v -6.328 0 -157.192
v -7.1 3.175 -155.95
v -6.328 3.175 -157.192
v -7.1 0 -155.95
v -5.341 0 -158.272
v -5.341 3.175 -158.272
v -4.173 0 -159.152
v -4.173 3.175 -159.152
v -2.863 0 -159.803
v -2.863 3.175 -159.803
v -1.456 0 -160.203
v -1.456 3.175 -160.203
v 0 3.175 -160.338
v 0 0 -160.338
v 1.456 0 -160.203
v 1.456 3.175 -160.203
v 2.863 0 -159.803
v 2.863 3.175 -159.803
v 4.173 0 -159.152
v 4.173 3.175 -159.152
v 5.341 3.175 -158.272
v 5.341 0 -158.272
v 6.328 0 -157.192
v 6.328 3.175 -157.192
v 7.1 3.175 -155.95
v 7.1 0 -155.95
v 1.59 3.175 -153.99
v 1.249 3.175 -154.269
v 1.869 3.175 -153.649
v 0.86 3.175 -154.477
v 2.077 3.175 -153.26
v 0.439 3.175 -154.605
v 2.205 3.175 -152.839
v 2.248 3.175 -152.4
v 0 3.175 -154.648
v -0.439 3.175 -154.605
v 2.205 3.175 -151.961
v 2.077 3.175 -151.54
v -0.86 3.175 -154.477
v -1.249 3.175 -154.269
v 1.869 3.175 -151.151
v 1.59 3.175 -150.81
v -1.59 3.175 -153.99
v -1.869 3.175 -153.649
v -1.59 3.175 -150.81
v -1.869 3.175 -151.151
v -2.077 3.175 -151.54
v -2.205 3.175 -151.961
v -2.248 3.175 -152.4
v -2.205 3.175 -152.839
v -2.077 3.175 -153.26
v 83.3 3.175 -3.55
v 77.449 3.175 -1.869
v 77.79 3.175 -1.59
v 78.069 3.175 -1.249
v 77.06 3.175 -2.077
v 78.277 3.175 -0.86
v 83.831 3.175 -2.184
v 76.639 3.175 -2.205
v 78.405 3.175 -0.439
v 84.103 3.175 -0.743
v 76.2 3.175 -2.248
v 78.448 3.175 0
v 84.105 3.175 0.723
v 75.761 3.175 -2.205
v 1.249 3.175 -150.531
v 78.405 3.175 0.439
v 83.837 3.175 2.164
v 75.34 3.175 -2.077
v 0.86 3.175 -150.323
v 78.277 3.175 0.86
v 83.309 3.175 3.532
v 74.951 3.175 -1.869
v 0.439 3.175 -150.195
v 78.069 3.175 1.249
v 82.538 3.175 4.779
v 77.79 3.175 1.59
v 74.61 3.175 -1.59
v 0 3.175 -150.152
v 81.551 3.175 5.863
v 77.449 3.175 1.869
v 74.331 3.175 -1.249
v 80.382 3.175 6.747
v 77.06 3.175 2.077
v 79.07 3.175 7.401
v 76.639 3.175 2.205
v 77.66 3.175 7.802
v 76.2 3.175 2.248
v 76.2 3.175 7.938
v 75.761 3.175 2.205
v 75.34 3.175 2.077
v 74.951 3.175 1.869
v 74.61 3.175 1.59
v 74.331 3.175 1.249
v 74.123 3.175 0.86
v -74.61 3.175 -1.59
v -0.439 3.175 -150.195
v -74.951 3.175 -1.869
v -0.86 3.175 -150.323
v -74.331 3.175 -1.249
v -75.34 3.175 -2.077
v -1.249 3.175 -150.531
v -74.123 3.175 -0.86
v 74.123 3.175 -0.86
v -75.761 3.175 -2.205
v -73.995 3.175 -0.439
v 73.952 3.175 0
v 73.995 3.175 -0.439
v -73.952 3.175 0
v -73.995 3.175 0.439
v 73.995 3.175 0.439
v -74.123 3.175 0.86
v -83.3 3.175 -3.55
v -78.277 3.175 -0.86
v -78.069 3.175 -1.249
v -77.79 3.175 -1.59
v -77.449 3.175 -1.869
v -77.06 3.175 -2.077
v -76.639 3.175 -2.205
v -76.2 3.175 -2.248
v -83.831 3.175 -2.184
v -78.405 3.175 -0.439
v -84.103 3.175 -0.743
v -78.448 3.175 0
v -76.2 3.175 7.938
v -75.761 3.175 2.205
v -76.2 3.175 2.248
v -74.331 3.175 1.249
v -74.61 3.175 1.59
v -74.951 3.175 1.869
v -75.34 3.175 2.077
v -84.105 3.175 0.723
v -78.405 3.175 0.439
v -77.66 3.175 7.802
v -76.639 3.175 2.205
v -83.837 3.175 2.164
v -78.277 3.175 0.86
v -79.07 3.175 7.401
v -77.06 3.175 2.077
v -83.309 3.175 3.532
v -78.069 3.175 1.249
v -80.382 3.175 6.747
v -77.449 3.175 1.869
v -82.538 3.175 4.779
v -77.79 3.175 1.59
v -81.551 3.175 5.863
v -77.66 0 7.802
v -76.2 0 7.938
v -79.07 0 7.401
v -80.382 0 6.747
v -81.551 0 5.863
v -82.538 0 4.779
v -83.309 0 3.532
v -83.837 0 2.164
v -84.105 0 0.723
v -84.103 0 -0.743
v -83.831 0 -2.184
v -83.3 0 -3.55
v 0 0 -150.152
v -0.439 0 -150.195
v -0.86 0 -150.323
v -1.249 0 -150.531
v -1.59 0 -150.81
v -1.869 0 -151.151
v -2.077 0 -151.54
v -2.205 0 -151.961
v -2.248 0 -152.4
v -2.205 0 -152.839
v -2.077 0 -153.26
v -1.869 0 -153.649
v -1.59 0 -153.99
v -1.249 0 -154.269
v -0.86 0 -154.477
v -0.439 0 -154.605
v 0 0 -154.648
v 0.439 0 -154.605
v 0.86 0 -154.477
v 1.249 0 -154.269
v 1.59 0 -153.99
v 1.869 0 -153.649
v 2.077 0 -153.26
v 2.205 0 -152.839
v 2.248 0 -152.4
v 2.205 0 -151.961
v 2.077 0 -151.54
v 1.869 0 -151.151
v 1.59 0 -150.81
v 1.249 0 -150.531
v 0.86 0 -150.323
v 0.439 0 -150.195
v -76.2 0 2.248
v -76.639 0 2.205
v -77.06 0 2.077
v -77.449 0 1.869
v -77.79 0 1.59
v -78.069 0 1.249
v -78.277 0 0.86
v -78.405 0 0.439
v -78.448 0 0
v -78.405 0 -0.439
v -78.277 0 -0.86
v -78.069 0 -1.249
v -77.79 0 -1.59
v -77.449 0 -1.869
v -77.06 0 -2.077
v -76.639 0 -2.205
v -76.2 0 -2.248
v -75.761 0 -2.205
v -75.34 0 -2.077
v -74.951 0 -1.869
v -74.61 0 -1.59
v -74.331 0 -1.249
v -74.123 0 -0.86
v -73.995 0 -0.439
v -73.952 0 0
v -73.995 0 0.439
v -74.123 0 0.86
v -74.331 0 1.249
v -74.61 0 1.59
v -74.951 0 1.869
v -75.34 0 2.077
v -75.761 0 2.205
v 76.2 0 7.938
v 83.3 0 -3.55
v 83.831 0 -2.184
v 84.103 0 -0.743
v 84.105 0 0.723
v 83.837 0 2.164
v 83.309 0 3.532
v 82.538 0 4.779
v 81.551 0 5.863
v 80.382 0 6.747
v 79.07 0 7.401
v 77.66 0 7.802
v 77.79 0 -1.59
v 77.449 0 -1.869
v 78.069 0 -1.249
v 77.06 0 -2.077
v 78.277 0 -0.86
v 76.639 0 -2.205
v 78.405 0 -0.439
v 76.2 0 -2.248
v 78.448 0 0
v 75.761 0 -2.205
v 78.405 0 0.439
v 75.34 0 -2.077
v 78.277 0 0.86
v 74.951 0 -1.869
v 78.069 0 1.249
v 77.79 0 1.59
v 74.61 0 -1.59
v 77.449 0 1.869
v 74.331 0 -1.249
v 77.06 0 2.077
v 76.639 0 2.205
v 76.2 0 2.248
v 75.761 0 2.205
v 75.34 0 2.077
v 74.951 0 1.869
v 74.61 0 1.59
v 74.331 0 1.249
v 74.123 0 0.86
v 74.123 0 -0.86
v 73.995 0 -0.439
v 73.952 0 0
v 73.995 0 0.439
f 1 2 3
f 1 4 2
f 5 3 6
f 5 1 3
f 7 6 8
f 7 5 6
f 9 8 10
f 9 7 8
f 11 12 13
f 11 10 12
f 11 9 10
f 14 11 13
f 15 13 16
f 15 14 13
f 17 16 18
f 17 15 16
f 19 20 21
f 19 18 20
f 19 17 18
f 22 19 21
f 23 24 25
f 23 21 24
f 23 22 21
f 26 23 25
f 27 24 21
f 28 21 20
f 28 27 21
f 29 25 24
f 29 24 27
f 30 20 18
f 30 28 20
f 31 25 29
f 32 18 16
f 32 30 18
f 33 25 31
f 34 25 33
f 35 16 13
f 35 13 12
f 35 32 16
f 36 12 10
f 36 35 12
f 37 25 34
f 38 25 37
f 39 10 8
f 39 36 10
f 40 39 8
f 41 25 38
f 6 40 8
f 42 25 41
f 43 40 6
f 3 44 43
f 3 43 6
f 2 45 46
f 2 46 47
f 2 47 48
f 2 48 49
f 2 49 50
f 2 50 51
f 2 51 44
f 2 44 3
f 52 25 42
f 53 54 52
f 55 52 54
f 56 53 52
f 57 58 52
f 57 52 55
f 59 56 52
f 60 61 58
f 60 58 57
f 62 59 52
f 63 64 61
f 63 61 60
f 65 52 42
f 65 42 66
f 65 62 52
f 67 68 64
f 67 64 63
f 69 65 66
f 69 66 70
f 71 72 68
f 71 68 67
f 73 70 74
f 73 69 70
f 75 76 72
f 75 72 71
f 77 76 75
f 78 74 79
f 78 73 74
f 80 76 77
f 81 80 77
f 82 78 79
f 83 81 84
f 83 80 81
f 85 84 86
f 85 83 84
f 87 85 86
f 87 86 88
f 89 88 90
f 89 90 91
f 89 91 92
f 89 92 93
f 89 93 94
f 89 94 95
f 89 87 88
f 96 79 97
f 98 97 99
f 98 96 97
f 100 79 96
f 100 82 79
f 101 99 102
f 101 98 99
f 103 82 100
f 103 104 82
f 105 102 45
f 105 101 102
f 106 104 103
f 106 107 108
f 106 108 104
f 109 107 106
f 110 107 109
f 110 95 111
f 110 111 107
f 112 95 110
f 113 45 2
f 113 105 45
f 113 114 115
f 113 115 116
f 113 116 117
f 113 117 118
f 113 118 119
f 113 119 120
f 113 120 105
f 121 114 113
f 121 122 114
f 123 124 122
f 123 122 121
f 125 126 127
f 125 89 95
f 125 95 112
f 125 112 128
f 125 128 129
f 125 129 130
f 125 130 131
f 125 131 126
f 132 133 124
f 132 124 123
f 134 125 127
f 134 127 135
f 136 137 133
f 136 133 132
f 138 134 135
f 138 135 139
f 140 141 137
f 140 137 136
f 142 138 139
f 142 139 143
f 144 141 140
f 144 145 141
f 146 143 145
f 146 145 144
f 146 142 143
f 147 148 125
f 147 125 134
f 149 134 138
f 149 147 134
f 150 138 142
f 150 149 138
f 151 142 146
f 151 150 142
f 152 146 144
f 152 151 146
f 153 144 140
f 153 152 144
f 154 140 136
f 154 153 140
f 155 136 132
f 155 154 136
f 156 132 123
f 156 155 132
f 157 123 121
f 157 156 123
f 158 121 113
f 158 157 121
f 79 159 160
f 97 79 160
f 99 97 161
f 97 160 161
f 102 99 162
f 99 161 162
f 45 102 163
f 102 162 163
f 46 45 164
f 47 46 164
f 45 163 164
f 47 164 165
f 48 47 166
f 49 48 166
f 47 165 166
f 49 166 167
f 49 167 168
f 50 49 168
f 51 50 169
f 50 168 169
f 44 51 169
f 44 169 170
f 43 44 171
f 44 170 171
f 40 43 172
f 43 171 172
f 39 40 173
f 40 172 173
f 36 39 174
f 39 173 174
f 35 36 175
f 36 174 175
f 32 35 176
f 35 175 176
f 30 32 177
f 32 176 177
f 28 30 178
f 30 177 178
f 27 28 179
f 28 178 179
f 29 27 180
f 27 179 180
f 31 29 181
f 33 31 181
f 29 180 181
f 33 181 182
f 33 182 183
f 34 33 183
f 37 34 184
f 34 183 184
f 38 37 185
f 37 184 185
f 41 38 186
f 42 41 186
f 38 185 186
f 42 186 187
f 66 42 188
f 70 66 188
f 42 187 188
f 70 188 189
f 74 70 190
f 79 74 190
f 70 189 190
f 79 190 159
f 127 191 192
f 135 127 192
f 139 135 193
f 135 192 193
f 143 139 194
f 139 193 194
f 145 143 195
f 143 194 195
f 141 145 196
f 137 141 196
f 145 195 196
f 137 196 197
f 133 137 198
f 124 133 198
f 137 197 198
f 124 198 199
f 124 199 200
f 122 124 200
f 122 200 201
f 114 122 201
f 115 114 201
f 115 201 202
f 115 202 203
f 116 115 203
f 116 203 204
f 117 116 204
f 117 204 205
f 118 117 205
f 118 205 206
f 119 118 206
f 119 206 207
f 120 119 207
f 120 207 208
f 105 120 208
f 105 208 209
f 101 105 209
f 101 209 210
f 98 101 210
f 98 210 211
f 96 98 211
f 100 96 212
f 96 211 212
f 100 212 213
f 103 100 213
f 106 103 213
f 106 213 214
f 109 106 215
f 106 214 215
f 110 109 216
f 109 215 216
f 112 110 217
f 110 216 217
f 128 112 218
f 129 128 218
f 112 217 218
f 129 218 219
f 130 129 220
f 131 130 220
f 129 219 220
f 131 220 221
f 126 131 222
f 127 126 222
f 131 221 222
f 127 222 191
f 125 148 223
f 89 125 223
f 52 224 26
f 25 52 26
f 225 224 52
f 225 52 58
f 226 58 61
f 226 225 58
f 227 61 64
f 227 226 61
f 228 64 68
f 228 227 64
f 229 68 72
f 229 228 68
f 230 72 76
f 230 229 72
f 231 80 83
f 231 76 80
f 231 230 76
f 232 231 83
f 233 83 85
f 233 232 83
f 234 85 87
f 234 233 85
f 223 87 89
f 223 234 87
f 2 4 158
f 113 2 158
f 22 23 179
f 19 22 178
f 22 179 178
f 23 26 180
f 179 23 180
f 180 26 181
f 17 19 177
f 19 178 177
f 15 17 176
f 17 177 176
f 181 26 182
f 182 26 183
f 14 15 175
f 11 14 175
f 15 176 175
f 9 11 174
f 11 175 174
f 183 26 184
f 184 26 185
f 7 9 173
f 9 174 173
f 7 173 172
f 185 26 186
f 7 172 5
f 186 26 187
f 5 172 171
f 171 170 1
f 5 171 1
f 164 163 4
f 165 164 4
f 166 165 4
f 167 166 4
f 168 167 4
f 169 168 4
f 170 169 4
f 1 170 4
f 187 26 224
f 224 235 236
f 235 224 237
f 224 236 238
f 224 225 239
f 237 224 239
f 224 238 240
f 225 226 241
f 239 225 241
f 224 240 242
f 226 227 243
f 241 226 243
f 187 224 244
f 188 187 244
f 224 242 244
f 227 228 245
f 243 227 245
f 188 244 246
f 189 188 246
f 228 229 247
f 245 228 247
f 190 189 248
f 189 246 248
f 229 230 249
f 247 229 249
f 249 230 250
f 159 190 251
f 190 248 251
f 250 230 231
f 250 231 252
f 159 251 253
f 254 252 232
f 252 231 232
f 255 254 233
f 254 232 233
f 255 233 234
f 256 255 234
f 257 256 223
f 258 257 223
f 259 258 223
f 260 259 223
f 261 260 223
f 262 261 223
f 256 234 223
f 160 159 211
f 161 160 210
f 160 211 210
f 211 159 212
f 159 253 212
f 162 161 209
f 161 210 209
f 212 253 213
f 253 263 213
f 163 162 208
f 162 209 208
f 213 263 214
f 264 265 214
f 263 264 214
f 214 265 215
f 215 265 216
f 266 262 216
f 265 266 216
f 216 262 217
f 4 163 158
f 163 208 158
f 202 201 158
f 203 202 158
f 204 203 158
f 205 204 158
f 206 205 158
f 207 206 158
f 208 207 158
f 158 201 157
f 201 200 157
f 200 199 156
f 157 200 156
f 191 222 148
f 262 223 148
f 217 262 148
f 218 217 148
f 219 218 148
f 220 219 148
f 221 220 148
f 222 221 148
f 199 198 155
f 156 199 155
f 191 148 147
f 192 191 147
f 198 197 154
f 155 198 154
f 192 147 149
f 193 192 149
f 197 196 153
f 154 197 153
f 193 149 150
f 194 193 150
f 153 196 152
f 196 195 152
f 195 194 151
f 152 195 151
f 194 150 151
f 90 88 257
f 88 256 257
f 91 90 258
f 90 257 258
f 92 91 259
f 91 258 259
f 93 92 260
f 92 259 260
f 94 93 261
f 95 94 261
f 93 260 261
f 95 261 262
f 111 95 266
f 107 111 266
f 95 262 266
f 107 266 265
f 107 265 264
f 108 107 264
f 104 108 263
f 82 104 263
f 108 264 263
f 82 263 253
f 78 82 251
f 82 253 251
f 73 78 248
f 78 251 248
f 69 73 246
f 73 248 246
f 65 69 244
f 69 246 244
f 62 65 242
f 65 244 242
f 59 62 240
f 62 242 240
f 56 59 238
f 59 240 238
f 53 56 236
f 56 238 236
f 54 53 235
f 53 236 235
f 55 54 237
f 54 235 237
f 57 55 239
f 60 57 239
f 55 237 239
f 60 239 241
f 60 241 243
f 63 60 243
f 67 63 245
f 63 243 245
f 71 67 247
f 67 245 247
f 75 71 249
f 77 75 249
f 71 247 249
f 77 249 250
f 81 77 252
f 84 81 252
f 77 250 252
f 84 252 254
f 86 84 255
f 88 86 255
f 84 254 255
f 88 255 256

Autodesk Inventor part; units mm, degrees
ref_plane "YZ Plane" through (0, 0, 0) normal (1, 0, 0) x (0, 1, 0)
ref_plane "XZ Plane" through (0, 0, 0) normal (0, 1, 0) x (-1, 0, 0)
ref_plane "XY Plane" through (0, 0, 0) normal (0, 0, 1) x (1, 0, 0)
sketch "Sketch1" plane through (0, 0, 0) normal (0, 1, 0) x (-1, 0, 0)
  line L0 (76.2, 0) -> (-76.2, 0)
  line L1 (0, 0) -> (0, -152.4)
  line L2 (7.0995, -155.9498) -> (83.2995, -3.5498)
  line L3 (76.2, 7.9375) -> (-76.2, 7.9375)
  line L4 (-83.2995, -3.5498) -> (-7.0995, -155.9498)
  circle A0 centre (76.2, 0) radius 7.9375
  circle A1 centre (-76.2, 0) radius 7.9375
  circle A2 centre (0, -152.4) radius 7.9375
  dimension "d0" = 152.4
  dimension "d1" = 152.4
  dimension "d3" = 15.875
  dimension "d4" = 15.875
  dimension "d5" = 15.875
extrude "Extrusion1" add sketch "Sketch1" along normal blind 3.175
sketch "Sketch2" plane through (0, 3.175, 0) normal (0, 1, 0) x (1, 0, 0)
  arc A0 (-83.2995, 3.5498) -> (-76.2, -7.9375) centre (-76.2, 0) ccw projected
  line L0 (-76.2, -7.9375) -> (76.2, -7.9375) projected
  arc A1 (76.2, -7.9375) -> (83.2995, 3.5498) centre (76.2, 0) ccw projected
  line L1 (83.2995, 3.5498) -> (7.0995, 155.9498) projected
  arc A2 (7.0995, 155.9498) -> (-7.0995, 155.9498) centre (0, 152.4) ccw projected
  line L2 (-7.0995, 155.9498) -> (-83.2995, 3.5498) projected
  point P0 (0, 0)
hole "Hole1" at (-76.2, 3.175, 0) at (76.2, 3.175, 0) at (0, 3.175, -152.4) direction (0, -1, 0) diameter 4.4958 end through all clearance for "Countersunk Flat Head Screw ISO 2009/7046" size "M4" standard "ISO"
properties part number "Bed Support"
